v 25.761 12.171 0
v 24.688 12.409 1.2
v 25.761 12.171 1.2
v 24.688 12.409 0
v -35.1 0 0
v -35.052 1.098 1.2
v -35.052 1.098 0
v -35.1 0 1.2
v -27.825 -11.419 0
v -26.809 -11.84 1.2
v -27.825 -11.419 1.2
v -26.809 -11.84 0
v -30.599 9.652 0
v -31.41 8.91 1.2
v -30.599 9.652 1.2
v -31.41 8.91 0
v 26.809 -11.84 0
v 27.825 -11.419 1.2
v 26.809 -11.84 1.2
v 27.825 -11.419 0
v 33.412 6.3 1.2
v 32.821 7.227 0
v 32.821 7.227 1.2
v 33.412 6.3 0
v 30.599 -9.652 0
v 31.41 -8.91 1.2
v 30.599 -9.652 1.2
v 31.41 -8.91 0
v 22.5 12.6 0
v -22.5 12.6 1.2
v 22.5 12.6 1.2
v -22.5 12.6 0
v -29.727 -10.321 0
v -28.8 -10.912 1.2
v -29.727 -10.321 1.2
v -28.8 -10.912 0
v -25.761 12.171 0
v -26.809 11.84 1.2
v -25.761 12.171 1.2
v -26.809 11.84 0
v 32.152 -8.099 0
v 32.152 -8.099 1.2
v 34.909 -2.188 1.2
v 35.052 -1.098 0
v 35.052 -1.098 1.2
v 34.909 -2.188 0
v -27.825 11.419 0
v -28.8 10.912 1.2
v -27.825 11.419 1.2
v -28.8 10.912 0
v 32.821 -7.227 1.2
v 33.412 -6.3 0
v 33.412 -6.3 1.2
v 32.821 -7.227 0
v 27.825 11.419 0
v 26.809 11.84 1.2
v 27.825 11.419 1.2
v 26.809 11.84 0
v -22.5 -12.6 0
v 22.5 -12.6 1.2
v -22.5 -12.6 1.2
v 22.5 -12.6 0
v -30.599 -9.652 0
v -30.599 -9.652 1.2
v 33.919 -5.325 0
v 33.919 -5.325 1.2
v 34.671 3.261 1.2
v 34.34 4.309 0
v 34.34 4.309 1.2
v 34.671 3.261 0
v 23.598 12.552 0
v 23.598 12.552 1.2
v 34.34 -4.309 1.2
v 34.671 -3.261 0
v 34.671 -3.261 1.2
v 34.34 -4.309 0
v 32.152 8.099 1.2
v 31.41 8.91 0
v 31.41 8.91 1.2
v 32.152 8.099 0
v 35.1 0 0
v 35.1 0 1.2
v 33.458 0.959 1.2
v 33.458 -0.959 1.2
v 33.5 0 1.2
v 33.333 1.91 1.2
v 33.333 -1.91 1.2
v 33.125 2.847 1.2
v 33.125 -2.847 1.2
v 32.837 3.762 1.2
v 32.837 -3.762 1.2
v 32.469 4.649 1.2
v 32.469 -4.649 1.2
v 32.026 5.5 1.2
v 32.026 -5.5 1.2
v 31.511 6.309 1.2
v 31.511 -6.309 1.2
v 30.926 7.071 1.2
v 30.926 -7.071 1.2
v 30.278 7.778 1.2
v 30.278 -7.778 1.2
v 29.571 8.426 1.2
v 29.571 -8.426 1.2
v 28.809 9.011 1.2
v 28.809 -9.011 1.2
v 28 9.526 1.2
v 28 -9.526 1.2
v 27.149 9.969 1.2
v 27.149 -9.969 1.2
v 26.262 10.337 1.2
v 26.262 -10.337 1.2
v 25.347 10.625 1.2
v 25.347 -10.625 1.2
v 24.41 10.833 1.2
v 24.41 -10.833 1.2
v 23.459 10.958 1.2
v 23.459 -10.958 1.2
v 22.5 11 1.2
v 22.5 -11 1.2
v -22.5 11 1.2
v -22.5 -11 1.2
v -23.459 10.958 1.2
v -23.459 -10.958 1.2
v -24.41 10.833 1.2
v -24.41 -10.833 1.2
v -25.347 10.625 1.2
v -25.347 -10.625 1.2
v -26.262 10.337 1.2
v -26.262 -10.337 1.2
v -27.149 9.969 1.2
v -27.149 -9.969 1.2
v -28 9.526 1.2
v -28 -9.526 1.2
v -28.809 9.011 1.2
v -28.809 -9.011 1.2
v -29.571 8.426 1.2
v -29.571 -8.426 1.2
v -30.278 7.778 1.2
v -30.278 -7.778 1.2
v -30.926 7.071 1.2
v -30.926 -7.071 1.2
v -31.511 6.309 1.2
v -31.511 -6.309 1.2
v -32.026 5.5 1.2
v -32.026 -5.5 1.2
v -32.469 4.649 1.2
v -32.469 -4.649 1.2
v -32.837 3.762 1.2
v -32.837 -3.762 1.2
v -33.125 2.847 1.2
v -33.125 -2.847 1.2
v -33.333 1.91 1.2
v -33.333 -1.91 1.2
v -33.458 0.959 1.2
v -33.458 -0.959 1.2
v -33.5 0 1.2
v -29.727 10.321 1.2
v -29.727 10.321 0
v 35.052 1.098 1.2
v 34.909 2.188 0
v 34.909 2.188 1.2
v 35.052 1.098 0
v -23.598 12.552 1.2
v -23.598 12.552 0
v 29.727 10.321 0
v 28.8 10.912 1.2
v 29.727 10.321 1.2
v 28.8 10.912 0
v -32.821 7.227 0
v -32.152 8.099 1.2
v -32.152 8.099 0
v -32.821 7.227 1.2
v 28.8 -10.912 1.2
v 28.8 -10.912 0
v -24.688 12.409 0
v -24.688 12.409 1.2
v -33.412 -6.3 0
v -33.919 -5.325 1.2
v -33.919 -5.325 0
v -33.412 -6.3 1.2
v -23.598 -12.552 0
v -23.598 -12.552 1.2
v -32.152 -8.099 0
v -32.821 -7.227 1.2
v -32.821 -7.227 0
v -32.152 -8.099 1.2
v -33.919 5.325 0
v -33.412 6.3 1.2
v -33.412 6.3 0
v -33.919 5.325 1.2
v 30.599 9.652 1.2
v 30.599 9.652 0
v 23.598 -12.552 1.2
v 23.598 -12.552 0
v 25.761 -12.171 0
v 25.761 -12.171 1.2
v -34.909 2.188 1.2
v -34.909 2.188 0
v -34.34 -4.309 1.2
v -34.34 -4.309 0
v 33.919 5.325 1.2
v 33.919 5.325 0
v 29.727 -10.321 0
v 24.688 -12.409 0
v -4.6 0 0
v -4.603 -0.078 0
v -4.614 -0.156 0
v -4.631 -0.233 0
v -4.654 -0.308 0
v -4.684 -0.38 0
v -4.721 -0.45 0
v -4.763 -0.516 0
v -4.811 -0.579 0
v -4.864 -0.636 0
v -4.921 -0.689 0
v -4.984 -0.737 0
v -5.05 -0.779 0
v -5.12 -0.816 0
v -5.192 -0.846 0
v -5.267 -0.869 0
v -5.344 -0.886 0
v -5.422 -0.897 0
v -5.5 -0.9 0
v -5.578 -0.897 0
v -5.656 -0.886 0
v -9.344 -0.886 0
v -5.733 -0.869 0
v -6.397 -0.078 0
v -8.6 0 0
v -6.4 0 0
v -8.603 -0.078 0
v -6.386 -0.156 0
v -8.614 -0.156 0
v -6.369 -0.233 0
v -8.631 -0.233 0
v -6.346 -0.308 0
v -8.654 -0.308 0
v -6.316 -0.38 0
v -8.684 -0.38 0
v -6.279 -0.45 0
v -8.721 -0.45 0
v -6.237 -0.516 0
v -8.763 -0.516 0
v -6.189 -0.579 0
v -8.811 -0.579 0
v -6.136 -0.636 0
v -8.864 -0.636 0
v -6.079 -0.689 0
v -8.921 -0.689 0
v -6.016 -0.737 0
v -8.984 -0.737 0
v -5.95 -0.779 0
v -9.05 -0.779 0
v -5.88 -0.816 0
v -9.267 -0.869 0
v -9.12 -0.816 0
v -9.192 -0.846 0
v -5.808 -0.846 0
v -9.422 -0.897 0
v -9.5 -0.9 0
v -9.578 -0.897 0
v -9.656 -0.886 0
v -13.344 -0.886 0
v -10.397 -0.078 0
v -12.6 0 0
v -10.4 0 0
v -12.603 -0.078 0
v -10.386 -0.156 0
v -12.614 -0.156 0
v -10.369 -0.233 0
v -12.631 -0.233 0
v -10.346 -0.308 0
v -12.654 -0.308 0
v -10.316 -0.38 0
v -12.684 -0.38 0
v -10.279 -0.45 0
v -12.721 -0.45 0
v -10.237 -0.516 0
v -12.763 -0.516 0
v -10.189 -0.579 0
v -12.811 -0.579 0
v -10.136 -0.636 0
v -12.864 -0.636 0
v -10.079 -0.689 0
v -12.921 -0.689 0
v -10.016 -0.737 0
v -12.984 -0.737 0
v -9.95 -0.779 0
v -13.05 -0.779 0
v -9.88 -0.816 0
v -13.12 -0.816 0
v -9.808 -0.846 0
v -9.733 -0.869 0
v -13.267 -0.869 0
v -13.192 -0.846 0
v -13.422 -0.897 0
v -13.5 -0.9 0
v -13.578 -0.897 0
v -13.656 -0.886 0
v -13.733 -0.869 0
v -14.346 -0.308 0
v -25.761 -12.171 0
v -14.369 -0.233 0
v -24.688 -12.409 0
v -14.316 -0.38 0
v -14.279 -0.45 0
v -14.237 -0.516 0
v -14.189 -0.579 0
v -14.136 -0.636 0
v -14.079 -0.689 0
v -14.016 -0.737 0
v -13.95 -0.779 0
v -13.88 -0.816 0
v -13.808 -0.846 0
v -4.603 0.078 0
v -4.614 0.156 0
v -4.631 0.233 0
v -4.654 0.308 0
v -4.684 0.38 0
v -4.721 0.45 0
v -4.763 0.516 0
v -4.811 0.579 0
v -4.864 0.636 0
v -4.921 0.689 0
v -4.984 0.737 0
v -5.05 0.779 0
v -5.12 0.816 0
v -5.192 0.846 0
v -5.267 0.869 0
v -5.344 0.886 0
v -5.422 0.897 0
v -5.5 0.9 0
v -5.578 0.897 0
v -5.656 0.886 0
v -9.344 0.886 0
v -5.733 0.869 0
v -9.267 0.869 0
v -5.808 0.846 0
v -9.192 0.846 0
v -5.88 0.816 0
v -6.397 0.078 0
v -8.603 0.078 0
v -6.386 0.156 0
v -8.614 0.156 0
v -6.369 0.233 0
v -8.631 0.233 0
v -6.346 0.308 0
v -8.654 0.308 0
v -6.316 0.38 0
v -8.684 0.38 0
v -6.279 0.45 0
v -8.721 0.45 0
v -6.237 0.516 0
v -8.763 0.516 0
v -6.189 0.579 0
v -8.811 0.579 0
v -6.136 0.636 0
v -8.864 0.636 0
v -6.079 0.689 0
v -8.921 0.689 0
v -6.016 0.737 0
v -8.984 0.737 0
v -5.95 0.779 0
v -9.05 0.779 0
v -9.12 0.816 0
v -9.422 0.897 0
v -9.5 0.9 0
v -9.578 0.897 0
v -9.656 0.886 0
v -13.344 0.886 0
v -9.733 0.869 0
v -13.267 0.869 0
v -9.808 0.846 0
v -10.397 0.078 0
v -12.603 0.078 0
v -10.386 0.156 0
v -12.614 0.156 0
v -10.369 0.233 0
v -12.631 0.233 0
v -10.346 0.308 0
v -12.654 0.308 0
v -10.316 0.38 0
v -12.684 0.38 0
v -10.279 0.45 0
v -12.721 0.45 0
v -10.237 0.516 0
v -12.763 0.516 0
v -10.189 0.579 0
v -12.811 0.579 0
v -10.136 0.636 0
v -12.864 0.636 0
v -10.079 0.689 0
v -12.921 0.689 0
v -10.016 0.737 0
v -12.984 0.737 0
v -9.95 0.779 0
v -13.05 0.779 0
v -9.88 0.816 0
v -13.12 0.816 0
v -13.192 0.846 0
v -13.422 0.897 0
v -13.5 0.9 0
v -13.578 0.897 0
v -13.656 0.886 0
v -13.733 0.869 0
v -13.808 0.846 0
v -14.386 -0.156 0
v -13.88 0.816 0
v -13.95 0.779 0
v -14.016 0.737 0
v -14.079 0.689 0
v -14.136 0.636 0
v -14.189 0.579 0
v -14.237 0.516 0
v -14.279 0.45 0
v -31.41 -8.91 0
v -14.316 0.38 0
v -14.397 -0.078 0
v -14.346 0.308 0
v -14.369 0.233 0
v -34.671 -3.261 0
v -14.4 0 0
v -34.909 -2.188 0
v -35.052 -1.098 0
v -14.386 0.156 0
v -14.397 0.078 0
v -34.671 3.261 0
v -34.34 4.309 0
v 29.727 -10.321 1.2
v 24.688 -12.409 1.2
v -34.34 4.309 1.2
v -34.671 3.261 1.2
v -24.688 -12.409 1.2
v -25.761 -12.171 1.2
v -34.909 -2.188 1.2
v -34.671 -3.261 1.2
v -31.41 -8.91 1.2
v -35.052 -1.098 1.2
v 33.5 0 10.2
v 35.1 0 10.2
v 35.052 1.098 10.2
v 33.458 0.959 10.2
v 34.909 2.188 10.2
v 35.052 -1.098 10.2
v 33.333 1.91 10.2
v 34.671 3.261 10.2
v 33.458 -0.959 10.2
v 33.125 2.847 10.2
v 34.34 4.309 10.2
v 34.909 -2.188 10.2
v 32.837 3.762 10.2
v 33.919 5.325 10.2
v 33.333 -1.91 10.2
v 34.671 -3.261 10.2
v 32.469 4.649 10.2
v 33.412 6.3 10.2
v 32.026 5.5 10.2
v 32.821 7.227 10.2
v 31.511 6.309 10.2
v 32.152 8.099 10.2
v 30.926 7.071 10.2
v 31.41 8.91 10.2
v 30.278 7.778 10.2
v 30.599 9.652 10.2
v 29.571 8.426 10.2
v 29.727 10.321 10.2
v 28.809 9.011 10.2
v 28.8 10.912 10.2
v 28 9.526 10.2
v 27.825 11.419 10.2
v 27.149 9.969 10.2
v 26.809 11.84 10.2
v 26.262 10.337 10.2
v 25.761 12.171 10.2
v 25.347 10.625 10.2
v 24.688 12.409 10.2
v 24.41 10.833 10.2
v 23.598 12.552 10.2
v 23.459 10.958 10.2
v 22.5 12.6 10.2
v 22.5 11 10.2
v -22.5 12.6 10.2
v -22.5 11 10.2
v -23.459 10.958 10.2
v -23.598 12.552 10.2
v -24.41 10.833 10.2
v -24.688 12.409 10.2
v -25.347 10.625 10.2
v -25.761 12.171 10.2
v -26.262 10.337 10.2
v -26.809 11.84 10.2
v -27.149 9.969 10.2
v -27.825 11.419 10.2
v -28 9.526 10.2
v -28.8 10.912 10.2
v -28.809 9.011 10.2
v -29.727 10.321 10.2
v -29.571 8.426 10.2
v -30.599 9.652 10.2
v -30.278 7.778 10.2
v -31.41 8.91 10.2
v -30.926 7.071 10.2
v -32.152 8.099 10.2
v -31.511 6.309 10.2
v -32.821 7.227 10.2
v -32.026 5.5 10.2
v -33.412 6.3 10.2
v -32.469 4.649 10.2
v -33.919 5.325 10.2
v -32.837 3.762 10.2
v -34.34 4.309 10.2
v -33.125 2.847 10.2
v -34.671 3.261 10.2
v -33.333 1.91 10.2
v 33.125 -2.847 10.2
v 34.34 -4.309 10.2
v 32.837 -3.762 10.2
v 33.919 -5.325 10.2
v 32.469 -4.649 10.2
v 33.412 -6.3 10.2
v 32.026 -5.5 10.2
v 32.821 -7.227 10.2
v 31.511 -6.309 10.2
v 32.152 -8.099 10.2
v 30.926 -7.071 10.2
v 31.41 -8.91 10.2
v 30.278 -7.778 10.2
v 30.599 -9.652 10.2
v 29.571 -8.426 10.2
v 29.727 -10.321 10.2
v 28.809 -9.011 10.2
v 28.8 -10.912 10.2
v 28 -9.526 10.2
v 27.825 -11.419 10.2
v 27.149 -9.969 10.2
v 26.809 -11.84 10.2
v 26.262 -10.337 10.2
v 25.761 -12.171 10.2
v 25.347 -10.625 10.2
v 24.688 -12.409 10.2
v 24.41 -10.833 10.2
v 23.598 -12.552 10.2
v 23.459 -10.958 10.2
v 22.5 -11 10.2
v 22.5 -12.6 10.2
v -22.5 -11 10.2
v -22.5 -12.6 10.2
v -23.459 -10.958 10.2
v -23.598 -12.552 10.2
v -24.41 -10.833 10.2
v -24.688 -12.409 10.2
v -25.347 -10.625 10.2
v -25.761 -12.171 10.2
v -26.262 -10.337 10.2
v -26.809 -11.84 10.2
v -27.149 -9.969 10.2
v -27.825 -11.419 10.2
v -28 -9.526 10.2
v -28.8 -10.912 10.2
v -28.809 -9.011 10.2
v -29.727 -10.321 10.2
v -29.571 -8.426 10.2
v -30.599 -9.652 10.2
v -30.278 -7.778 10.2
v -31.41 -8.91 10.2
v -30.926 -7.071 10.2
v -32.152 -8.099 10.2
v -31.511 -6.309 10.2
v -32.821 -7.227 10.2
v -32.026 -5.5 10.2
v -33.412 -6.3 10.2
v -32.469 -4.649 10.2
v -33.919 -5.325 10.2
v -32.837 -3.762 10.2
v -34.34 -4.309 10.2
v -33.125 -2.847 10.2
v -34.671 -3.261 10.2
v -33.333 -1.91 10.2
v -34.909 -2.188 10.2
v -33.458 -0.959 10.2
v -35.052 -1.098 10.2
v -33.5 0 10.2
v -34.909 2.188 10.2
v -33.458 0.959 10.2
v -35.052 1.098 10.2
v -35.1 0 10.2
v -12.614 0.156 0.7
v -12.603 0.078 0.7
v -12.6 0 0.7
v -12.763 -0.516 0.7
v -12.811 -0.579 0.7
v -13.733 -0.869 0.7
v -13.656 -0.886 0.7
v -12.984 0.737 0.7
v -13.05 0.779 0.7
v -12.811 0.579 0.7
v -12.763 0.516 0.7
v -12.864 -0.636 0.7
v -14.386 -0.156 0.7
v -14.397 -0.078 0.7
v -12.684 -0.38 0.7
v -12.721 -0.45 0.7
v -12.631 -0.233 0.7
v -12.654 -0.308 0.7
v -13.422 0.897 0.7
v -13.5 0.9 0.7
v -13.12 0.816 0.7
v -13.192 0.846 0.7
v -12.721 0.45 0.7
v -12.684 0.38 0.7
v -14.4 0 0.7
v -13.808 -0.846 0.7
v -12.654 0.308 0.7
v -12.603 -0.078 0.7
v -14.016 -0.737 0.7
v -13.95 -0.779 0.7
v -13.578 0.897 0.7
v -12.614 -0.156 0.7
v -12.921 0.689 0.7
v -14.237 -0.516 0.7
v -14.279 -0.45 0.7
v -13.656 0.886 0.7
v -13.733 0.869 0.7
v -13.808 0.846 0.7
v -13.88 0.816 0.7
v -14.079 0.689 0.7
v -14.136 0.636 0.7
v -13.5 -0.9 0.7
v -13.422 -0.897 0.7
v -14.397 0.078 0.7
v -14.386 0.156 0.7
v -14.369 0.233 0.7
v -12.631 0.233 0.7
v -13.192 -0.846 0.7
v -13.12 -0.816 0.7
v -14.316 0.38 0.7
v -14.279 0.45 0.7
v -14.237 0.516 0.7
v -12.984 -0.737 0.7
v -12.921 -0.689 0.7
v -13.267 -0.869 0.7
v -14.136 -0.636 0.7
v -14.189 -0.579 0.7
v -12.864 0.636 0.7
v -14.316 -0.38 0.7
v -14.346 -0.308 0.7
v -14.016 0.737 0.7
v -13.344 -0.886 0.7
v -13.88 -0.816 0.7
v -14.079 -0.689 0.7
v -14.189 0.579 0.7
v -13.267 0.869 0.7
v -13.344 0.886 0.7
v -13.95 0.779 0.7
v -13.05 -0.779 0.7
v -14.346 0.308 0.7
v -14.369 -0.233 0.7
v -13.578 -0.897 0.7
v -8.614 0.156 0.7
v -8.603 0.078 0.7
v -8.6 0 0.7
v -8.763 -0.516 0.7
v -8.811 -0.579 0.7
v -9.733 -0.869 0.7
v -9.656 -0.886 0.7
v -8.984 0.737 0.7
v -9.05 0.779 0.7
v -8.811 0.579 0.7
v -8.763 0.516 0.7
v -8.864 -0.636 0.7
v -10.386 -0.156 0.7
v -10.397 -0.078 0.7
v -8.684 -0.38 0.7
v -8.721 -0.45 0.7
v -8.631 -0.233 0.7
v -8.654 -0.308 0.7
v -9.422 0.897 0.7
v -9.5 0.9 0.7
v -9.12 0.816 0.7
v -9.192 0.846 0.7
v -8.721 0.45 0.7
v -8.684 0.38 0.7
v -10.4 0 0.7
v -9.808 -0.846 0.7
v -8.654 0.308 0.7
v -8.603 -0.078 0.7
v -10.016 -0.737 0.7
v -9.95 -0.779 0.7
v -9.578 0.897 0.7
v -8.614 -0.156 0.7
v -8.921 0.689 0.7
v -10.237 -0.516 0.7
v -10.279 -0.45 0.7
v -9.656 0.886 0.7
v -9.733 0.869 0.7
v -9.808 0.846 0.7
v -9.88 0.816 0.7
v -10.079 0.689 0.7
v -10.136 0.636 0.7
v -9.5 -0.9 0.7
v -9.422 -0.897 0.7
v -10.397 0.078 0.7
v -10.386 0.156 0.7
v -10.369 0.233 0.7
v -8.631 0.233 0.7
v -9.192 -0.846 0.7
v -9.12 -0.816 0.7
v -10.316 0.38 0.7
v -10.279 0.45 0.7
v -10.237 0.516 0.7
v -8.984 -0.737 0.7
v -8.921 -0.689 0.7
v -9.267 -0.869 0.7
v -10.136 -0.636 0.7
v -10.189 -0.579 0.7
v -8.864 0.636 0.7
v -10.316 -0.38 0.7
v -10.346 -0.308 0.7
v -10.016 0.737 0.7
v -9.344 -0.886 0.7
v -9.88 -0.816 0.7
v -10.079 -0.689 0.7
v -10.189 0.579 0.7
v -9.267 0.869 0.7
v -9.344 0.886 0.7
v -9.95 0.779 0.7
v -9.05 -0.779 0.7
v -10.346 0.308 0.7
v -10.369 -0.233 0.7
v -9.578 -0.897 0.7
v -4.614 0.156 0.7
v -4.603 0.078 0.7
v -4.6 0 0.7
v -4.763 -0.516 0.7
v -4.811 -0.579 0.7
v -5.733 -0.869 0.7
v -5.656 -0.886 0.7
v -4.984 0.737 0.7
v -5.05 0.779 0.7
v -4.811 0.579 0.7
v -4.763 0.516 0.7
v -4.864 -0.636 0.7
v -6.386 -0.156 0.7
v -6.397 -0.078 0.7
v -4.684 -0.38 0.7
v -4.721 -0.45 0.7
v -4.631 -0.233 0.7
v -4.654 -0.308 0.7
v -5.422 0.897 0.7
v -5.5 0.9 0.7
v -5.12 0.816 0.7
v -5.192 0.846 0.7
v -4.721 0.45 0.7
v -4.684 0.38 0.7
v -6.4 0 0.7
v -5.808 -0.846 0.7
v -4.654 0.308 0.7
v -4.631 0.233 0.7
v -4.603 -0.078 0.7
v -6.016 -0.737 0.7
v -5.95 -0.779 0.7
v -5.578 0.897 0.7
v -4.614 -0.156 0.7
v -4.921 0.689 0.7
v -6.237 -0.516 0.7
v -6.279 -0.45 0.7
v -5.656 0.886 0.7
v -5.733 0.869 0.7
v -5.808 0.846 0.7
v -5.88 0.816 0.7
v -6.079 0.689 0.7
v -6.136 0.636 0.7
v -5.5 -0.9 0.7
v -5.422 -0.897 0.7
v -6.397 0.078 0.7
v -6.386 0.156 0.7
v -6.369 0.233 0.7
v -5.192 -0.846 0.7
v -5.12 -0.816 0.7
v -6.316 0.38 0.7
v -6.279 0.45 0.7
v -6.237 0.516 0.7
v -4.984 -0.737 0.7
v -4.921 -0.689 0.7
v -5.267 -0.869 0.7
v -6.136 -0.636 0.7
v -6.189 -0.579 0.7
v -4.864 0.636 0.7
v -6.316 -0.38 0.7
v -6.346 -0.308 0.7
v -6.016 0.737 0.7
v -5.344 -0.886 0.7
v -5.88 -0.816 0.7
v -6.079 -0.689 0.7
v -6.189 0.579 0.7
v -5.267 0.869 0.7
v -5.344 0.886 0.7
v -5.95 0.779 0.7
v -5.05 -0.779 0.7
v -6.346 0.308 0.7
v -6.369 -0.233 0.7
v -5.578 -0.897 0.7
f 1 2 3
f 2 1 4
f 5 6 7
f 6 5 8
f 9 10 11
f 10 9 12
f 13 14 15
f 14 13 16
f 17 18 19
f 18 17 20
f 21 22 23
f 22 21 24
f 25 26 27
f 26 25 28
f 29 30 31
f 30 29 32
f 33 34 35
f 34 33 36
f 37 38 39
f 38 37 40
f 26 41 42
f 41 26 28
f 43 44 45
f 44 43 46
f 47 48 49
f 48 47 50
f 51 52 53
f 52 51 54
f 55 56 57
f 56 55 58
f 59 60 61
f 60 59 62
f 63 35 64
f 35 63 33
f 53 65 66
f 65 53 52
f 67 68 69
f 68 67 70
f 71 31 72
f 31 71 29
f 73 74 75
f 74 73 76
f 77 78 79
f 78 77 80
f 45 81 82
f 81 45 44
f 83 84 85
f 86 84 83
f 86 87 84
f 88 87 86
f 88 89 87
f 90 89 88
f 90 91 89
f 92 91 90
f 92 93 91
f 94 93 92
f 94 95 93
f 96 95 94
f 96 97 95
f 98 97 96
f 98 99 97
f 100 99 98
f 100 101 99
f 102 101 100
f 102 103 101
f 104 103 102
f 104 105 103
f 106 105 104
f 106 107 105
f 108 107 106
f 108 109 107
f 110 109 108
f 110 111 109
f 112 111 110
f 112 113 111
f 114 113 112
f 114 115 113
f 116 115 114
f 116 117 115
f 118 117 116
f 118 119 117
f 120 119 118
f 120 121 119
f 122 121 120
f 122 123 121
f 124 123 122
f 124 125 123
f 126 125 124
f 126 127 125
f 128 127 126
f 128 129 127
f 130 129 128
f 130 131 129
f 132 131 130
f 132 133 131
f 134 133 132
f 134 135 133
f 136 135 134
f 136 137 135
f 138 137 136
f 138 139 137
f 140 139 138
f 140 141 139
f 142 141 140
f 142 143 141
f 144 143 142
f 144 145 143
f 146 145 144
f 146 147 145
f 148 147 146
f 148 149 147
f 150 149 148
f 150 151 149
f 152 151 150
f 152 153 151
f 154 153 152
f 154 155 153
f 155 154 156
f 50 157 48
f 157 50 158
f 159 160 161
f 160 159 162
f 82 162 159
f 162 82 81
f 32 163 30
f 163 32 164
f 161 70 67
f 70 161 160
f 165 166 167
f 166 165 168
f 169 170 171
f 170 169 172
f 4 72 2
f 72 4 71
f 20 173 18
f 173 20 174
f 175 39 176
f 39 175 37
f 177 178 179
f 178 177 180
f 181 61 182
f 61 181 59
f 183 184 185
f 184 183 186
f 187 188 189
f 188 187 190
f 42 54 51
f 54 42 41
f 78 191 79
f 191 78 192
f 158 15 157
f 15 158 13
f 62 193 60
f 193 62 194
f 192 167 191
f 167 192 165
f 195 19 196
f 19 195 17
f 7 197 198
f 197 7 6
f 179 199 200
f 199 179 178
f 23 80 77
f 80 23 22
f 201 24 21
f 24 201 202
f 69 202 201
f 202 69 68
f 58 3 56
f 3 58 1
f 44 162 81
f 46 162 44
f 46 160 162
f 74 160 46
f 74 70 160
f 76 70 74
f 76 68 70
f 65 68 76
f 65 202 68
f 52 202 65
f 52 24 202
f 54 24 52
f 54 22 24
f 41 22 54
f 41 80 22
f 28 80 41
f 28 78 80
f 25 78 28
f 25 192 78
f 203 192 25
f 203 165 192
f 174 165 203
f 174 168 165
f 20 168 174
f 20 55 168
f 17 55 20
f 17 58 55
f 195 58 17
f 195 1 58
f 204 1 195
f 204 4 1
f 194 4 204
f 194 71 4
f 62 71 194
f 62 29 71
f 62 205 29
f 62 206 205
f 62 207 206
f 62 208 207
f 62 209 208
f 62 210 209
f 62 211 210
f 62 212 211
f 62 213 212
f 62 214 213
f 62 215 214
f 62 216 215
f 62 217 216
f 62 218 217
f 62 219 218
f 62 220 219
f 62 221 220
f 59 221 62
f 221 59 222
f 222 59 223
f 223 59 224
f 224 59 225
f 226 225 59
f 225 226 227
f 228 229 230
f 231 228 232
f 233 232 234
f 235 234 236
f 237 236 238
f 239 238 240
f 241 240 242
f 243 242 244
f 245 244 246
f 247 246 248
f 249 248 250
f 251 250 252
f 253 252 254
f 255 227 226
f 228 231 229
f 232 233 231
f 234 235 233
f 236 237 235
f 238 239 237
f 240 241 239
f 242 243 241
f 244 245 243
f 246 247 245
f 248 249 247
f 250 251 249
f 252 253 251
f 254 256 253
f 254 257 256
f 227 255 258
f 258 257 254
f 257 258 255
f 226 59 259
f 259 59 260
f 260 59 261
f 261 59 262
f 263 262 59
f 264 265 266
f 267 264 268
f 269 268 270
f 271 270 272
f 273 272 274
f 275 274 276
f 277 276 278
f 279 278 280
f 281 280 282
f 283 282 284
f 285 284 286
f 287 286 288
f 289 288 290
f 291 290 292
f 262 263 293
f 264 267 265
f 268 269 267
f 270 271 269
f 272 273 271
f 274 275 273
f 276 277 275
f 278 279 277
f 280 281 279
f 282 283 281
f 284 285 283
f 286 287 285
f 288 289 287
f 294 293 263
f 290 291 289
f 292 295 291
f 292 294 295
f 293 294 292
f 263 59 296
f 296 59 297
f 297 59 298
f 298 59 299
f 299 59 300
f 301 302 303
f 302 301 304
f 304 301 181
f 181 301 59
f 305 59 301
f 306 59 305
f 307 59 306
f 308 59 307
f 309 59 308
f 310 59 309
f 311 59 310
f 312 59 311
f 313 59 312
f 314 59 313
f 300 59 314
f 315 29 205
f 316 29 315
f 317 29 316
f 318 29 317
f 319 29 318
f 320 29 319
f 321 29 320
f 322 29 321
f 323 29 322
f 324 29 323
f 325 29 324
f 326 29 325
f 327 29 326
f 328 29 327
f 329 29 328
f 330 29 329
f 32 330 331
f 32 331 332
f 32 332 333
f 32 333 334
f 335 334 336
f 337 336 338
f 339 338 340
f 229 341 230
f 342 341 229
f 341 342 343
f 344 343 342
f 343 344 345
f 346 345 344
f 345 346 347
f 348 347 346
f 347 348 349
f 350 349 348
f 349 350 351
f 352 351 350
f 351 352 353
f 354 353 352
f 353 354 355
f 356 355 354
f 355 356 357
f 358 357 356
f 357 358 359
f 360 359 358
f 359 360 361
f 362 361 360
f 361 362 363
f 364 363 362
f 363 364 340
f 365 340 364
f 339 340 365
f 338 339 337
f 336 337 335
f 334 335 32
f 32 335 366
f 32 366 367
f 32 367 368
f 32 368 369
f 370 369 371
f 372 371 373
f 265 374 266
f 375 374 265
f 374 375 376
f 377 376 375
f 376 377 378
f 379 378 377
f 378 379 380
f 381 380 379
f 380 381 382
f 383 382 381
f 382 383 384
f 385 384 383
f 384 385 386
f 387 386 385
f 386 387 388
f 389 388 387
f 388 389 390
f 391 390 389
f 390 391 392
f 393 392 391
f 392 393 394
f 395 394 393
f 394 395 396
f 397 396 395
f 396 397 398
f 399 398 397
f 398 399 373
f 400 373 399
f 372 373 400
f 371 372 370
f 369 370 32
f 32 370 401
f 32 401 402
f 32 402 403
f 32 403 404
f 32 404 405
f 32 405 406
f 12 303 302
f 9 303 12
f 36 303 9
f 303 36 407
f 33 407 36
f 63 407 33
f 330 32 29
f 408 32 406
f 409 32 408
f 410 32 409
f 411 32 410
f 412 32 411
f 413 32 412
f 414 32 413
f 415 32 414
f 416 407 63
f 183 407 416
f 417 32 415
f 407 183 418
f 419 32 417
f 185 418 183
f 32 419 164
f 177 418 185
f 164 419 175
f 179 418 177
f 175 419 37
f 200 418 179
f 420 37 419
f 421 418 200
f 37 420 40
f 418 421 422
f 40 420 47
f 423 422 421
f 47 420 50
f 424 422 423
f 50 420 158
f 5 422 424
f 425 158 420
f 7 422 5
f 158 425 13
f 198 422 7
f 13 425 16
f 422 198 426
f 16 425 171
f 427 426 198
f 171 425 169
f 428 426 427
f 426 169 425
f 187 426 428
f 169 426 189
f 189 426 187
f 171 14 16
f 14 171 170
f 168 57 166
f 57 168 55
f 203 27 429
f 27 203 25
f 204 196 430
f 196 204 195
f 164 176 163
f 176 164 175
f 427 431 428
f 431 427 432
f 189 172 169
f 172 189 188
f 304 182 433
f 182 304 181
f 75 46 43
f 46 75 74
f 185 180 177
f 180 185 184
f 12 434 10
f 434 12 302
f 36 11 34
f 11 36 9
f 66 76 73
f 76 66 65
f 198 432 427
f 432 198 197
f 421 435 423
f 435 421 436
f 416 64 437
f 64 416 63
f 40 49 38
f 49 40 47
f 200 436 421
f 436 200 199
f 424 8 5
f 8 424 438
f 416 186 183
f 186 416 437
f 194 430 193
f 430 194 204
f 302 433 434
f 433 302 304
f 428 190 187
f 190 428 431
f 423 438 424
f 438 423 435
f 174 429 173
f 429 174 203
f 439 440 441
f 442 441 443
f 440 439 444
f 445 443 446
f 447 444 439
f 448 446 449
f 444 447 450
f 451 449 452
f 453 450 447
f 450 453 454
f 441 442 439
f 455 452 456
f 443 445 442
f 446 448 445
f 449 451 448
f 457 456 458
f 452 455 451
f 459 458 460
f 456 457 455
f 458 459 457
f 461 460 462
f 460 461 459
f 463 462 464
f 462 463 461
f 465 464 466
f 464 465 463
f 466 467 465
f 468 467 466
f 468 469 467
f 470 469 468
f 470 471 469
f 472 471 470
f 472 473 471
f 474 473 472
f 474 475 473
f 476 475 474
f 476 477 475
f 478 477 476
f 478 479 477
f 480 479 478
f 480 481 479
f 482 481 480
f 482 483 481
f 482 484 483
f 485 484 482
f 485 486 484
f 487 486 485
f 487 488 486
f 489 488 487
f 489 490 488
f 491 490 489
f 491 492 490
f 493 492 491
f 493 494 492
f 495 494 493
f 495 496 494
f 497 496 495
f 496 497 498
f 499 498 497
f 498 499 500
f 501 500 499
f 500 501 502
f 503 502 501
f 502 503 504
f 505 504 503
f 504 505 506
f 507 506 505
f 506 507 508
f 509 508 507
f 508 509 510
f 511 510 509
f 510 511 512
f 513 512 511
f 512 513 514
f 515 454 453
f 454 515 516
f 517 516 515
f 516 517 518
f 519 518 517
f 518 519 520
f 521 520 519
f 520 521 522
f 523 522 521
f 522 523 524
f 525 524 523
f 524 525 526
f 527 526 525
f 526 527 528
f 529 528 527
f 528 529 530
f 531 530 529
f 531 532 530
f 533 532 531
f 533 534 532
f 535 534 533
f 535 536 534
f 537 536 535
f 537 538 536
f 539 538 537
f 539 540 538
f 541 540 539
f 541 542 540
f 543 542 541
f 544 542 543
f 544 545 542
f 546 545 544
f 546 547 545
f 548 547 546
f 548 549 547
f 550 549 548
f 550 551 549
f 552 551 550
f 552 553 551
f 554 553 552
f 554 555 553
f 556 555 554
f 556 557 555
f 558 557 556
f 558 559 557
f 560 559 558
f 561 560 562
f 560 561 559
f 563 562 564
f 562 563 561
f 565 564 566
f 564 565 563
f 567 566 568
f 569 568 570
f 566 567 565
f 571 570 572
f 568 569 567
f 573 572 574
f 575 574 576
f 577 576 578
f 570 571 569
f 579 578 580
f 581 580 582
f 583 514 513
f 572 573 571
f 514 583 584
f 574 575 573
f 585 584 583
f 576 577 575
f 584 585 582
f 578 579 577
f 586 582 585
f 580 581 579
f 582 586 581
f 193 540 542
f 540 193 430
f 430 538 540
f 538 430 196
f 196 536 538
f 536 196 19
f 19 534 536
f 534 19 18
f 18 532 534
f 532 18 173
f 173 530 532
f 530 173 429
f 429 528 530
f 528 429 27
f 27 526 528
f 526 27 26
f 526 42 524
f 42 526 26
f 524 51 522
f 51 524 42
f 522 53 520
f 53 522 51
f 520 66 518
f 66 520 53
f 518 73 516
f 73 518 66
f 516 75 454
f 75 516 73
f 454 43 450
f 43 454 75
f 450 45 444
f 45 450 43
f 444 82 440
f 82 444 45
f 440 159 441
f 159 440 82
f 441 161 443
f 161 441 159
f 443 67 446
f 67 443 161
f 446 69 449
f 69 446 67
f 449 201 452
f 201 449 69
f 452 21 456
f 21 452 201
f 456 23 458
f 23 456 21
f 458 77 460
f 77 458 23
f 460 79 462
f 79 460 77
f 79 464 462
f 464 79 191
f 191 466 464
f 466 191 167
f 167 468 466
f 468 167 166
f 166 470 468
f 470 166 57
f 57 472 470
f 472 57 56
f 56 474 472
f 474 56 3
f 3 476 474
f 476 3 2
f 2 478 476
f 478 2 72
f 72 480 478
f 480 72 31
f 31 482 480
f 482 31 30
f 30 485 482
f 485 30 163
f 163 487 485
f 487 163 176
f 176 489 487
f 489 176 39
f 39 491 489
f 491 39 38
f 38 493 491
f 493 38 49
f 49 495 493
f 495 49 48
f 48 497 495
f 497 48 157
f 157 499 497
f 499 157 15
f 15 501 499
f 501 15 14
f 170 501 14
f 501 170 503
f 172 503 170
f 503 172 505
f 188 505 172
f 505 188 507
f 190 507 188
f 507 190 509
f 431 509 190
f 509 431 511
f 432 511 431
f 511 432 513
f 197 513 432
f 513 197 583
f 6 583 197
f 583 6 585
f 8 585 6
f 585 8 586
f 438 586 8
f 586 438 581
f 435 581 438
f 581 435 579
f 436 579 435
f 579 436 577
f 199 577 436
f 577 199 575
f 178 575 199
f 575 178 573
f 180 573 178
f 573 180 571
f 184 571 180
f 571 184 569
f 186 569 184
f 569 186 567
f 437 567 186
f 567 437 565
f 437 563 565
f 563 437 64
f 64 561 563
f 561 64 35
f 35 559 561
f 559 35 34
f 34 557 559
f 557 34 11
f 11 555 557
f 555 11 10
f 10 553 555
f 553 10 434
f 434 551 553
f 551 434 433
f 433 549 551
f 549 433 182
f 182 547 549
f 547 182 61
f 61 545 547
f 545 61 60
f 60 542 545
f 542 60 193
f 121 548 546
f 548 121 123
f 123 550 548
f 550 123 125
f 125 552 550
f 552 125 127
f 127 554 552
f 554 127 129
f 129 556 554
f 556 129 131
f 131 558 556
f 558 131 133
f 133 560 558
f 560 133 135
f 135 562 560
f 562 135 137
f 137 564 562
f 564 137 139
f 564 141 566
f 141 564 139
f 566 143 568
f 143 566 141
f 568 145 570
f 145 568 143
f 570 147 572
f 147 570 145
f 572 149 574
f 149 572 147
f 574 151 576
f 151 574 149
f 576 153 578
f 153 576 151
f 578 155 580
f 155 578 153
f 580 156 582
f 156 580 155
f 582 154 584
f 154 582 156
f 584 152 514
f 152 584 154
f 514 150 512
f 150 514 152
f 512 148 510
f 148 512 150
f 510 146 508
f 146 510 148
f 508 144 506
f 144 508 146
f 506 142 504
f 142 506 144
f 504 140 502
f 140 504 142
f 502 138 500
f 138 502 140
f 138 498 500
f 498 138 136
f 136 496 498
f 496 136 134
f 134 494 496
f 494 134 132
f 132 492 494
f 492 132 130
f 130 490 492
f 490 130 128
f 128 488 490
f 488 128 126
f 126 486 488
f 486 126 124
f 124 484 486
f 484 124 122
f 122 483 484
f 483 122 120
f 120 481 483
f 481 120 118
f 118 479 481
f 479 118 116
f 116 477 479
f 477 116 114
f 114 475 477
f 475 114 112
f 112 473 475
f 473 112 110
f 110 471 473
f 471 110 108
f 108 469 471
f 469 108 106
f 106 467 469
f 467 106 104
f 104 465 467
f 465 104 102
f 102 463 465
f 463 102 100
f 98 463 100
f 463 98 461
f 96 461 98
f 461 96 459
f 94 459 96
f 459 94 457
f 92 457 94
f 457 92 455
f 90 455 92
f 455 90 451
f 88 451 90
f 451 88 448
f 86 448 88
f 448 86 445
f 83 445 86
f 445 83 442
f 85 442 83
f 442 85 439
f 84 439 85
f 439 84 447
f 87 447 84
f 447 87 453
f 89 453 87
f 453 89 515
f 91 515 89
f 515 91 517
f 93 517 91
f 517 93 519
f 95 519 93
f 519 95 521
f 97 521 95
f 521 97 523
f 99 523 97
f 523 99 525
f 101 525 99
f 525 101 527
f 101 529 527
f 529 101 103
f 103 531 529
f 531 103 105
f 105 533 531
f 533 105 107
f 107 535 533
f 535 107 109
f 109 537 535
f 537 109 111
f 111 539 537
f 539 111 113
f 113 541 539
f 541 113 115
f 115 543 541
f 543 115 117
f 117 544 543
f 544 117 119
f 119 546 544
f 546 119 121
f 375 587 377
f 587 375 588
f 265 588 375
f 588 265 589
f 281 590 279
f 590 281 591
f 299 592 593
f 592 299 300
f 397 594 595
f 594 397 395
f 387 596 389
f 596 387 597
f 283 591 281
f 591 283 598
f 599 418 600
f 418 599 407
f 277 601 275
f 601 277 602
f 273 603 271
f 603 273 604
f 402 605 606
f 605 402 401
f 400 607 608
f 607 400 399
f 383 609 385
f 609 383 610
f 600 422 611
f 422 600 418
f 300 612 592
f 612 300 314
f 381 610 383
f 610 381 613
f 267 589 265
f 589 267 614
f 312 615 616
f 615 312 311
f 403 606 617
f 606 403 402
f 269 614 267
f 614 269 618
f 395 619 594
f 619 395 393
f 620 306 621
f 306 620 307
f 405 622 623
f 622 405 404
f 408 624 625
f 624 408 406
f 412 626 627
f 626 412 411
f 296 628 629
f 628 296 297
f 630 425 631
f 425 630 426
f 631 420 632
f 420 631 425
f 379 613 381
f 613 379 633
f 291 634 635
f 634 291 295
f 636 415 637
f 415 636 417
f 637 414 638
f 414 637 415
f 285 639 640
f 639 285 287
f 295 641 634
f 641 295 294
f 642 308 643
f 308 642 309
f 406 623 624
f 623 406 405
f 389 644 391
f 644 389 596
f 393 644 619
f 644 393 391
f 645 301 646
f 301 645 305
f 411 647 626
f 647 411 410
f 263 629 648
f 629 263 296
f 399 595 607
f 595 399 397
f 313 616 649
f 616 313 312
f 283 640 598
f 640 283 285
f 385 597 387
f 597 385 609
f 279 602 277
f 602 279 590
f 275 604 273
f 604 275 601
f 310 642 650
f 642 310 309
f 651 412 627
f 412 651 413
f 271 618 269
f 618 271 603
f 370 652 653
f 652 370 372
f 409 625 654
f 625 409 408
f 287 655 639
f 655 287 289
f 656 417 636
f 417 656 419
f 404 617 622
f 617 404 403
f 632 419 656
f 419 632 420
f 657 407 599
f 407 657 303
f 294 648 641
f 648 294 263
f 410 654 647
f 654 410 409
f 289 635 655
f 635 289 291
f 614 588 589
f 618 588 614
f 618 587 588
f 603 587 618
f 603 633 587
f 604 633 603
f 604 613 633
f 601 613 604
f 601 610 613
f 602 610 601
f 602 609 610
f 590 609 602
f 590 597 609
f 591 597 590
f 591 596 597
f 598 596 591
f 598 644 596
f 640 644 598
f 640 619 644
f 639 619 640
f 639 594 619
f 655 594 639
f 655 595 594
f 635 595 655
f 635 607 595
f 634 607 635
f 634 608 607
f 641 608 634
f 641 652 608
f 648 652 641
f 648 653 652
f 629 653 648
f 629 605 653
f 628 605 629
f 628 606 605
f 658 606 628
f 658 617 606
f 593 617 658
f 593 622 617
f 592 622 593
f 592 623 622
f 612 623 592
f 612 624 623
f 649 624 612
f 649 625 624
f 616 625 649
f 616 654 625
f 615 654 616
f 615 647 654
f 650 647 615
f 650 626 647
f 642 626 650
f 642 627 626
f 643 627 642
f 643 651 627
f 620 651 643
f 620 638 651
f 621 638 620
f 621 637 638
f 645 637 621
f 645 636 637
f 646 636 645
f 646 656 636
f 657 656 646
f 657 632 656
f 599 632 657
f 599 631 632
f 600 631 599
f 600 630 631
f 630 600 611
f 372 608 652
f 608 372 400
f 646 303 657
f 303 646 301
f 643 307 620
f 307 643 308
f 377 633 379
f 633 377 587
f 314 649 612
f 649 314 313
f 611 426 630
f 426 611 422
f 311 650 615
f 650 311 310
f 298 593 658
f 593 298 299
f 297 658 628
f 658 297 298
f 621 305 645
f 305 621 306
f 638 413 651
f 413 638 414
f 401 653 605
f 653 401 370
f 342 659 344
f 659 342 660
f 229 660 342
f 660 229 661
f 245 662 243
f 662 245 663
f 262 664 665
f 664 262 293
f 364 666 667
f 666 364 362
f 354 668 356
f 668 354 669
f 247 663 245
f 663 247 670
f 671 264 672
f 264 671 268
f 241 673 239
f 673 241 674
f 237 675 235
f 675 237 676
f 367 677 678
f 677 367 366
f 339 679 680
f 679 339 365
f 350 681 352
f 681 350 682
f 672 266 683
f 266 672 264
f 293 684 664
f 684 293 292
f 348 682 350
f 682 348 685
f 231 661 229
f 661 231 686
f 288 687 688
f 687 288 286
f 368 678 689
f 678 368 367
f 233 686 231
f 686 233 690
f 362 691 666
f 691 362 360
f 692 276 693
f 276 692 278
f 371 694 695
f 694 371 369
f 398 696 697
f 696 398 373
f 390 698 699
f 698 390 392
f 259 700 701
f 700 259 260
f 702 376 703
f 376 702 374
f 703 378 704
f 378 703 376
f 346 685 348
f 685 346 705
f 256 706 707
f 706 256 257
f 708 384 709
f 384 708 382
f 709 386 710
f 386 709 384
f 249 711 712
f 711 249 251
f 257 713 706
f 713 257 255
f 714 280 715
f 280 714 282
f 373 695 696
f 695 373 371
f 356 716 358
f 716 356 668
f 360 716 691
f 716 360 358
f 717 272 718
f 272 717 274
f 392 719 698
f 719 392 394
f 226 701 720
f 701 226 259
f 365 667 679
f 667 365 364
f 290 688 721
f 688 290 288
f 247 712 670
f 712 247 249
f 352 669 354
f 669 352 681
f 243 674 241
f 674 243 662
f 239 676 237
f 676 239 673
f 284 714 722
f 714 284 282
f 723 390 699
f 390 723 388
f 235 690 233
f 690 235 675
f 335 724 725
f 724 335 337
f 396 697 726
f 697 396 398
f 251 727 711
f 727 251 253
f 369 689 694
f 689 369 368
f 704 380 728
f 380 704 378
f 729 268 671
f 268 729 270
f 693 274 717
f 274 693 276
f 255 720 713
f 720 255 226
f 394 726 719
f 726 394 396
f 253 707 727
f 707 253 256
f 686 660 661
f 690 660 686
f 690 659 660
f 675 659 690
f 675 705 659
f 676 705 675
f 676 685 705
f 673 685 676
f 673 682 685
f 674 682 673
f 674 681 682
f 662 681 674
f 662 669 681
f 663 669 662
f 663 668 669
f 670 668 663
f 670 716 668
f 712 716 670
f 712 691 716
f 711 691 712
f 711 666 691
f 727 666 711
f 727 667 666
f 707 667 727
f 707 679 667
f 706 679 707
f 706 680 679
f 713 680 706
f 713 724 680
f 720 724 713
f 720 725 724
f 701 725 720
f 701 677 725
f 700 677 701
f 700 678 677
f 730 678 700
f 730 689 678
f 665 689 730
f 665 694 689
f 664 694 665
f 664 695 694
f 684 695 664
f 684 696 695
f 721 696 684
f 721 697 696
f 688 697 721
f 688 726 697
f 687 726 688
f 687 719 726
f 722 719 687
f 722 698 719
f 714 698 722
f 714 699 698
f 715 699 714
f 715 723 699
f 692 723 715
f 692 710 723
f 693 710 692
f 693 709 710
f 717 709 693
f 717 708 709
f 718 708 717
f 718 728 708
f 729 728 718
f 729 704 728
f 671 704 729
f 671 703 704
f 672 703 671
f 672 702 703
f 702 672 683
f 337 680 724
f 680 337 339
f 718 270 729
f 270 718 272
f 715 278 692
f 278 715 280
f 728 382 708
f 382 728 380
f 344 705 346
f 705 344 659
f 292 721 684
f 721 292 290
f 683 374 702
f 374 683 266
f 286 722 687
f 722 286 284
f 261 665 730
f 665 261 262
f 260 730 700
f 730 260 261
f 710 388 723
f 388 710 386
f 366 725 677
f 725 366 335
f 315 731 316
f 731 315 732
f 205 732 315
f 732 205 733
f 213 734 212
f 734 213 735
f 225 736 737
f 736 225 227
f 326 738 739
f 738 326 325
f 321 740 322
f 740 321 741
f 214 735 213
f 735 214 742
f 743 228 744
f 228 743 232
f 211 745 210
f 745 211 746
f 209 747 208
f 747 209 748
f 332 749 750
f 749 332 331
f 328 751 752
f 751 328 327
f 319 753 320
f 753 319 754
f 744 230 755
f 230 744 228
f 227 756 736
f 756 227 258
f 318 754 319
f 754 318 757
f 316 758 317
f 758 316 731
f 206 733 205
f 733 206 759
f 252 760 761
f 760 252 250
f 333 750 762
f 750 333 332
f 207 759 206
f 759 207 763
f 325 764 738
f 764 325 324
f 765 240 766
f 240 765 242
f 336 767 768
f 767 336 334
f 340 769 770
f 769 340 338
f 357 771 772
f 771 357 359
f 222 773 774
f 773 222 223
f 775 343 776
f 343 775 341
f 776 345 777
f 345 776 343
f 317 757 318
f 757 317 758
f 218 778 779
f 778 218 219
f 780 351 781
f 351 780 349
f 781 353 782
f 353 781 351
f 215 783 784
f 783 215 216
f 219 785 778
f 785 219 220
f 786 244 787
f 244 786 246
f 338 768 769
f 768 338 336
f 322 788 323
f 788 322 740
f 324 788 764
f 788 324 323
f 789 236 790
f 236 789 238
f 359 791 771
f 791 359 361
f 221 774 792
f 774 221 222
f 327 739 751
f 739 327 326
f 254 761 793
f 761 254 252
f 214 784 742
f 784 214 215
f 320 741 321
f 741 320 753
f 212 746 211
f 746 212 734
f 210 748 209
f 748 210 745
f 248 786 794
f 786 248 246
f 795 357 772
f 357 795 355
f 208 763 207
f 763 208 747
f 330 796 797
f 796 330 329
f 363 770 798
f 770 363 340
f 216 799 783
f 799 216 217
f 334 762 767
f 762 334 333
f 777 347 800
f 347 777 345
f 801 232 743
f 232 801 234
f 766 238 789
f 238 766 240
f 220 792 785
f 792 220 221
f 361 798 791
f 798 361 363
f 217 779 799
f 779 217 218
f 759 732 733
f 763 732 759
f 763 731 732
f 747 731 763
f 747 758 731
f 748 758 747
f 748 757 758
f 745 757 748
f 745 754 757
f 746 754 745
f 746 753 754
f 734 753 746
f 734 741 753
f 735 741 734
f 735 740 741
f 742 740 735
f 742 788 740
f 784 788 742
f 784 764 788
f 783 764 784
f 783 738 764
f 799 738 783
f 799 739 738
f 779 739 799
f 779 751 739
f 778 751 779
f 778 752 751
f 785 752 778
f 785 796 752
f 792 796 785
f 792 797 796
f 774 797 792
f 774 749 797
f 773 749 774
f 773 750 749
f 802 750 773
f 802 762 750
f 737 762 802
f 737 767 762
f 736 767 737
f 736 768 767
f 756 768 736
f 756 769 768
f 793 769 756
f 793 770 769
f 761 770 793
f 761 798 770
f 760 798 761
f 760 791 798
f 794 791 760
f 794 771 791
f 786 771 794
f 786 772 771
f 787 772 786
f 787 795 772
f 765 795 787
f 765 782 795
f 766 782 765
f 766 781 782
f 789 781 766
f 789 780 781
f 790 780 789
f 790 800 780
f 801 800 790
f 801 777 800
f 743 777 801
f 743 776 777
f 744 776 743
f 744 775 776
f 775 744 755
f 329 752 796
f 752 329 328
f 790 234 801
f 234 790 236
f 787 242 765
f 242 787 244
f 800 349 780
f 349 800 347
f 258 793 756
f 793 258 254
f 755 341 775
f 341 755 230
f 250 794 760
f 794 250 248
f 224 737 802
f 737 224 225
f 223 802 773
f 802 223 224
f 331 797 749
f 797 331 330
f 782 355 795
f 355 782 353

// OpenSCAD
// file: ../bolt.scad
bolt_pts  = [[155.0,300.0], [75.0,180.0], [130.0,180.0], [45.0,30.0]];
pixel_pts = [[155.0,300.0], [145.5,285.8], [136.0,271.5], [126.5,257.2], [117.0,243.0], [107.5,228.8], [98.0,214.5], [88.5,200.2], [79.0,186.0], [95.1,180.0], [112.3,180.0], [129.4,180.0], [121.4,164.8], [113.0,149.9], [104.5,135.1], [96.1,120.2], [87.6,105.3], [79.2,90.4], [70.8,75.5], [62.3,60.6], [53.9,45.7], [45.4,30.8]];

// ===== CHARGE lightning-bolt test piece — option C (~18mm channel) =====
bolt_inner     = 18;                       // channel interior (collar O16 fits)
bolt_wall      = 2;                         // wall thickness
bolt_outer     = bolt_inner + 2*bolt_wall; // 22mm outer stroke
bolt_gap       = 15;                       // LED-tip -> lens
bolt_ch_h      = dome_clear + bolt_gap;    // wall height above plate
bolt_lens_t    = 1.5;                       // lens face thickness
bolt_lip_h     = 2;                         // lens locating lip depth
bolt_lip_clear = 0.6;                       // lip clearance into channel
bolt_lip_t     = 1.2;                       // lip wall thickness

module bolt_stroke(w) {
    for (i = [0 : len(bolt_pts) - 2])
        hull() {
            translate(bolt_pts[i])     circle(d = w);
            translate(bolt_pts[i + 1]) circle(d = w);
        }
}

// wall_h = channel wall height above the plate (gap = wall_h - dome_clear).
// The lens caps the cross-section, so the SAME lens fits any wall_h.
module bolt_shell(wall_h = bolt_ch_h) {
    difference() {
        union() {
            linear_extrude(plate_t) bolt_stroke(bolt_outer);
            translate([0, 0, plate_t]) linear_extrude(wall_h)
                difference() { bolt_stroke(bolt_outer); bolt_stroke(bolt_inner); }
        }
        for (p = pixel_pts)
            translate([p[0], p[1], -0.1]) cylinder(h = plate_t + 0.2, d = pixel_through);
    }
    for (p = pixel_pts) place_collar(p[0], p[1]);
}

module bolt_lens() {
    union() {
        linear_extrude(bolt_lens_t) bolt_stroke(bolt_outer);
        translate([0, 0, bolt_lens_t]) linear_extrude(bolt_lip_h)
            difference() {
                bolt_stroke(bolt_inner - bolt_lip_clear);
                bolt_stroke(bolt_inner - bolt_lip_clear - 2 * bolt_lip_t);
            }
    }
}

// ----- snap-OVER lens: a cap that wraps the WHOLE bolt outside (skirt grips the
// 22mm outer wall). Works because the bolt is a single isolated piece. Top = the
// diffuser face. Print top-down, flip in use; fits any bolt height.
// 2-filament: clear for the first cap_top_t (top), white above (skirt) via a
// slicer height color-change. 3-filament: also paint the skirt's outer wall black.
cap_clear   = 0.3;   // skirt-inner = bolt_outer + this (slide/snap over)
cap_wall    = 1.6;   // skirt wall thickness
cap_top_t   = 1.2;   // diffuser top thickness
cap_skirt_h = 9;     // how far the skirt wraps down the bolt sides

module bolt_overcap() {
    si = bolt_outer + cap_clear;
    so = si + 2 * cap_wall;
    union() {
        linear_extrude(cap_top_t) bolt_stroke(so);
        translate([0, 0, cap_top_t]) linear_extrude(cap_skirt_h)
            difference() { bolt_stroke(so); bolt_stroke(si); }
    }
}

// Fit-test chunk: a short straight section of the over-cap at a chosen skirt
// clearance. Slide it onto a straight part of the printed bolt to feel the fit.
// `marks` debossed dots on the bed face = which one it is (more dots = tighter).
module cap_chunk(clear, marks, L = 45) {
    si = bolt_outer + clear;
    so = si + 2 * cap_wall;
    difference() {
        union() {
            linear_extrude(cap_top_t)
                hull() { translate([-L/2,0]) circle(d=so); translate([L/2,0]) circle(d=so); }
            translate([0,0,cap_top_t]) linear_extrude(cap_skirt_h)
                difference() {
                    hull() { translate([-L/2,0]) circle(d=so); translate([L/2,0]) circle(d=so); }
                    hull() { translate([-L/2,0]) circle(d=si); translate([L/2,0]) circle(d=si); }
                }
        }
        for (i = [0 : marks - 1])
            translate([-L/2 + 9 + i*4, 0, -0.1]) cylinder(h = 0.8, d = 1.8);
    }
}
// file: ../collar.scad
// Calibrated press-fit collar, merged into the rear wall at each pixel.
// The STL is symmetric top/bottom (retention lip at mid-height), so insertion
// direction does not matter. Native STL sits X-centered at collar_cx, Z 0..collar_h.

module collar_solid() {
    translate([-collar_cx, 0, 0])
        import(collar_stl, convexity = 6);
}

module place_collar(x, y) {
    translate([x, y, 0]) collar_solid();
}
// file: ../config.scad
// ===== CHARGE LED sign — global config =====
// Edit this file; then run ./build.sh to regenerate every STL.

$fn = 72;

// ---- calibrated collar (press-fit for 12mm bullet pixel) ----
collar_stl    = "../../assets/bullet-collar.stl"; // path resolved from src/parts/ entry files
collar_h      = 2.0;     // Z span of the collar STL
collar_od     = 16.0;    // collar outer diameter
collar_cx     = 43.0;    // STL native X center (Y center is 0)
pixel_through = 12.3;    // clearance hole through the plate (just over bore Ø12.19)
dome_clear    = 4.0;     // dome protrusion above plate front. Spec: 5.5mm dome-tip-to-flange,
                         // flange seats on plate back, minus 2mm plate ~= 3.5-4mm. Seat a real
                         // pixel and measure to lock it in.

// ---- shell ----
plate_t    = 2.0;        // rear plate thickness (== collar_h, so the collar sits flush)
wall_t     = 2.5;        // chimney wall thickness
cell_inner = 30;         // square interior of each test cell (the press-fit opening)

// ---- diffuser panels (flat, drop-in — kept for the final glued option) ----
panel_press_clear = 0.25; // panel is this much SMALLER than the opening (total) -> friction fit
panel_thicks      = [1, 2, 3];

// ---- diffuser CAP (slides over an ISOLATED chimney; not used on touching rows) ----
cap_fit_clear = 0.4;   // skirt-inner minus chimney-outer (total); bigger = looser slide
cap_skirt_t   = 1.6;   // skirt wall thickness
cap_skirt_h   = 7;     // how far the skirt grips down over the chimney

// ---- diffuser LID = flanged plug (plug locates in the opening, flange catches on the rim) ----
lid_flange_cover = wall_t;  // flange overhang per side ~= wall width (rests on rim, can't fall in)
lid_flange_gap   = 0.3;     // shrink the flange a hair so neighbour lids don't clash
lid_plug_h       = 4;       // how far the plug drops into the opening (0 = plain flat tile)
lid_plug_clear   = 0.2;     // plug-outer = opening minus this (total) -> friction fit
                            // (was 0.5/loose; PETG plug in a PLA hole grips well at 0.2)
lid_plug_wall    = 1.5;     // plug-frame wall thickness

// ---- coupon depth ladder ----
led_gaps = [10, 15, 20]; // clear LED-tip -> diffuser distance, per cell (mm)
                         // (was [20,35,50] — 35/50 went too dim/washed; 20 is the new max)

// ---- collar v2: original bore + lip, plus a 45-deg lead-in chamfer ----
bore_face_r   = 6.10;    // collar bore radius at each face (~Ø12.2)
chamfer_depth = 0.5;     // axial depth of the 45-deg lead-in at each face
mouth_r       = bore_face_r + chamfer_depth;  // chamfer mouth radius (~Ø13.2)

// ---- collar A/B test harness ----
harness_w     = 52;      // tile width
harness_d     = 30;      // tile depth
harness_t     = plate_t; // match the real wall thickness for a faithful fit test
harness_pitch = 24;      // spacing between the two hole centers

// ---- derived ----
cell_pitch = cell_inner + 2 * wall_t;      // outer cell footprint (35)
n_cells    = len(led_gaps);
plate_w    = n_cells * cell_pitch;
plate_d    = cell_pitch;
panel_side = cell_inner - panel_press_clear;
function cell_x(i)     = i * cell_pitch + cell_pitch / 2;   // column center (distance)
function cell_y(j)     = j * cell_pitch + cell_pitch / 2;   // row center (for grid coupons)
function chimney_H(i)  = plate_t + dome_clear + led_gaps[i];
// main file
// Fit test: over-cap skirt clearance 0.0mm (3 dots). Tightest — likely a snap
// once print tolerance is added.
include <../config.scad>
include <../collar.scad>
include <../bolt.scad>
cap_chunk(0.0, 3);
